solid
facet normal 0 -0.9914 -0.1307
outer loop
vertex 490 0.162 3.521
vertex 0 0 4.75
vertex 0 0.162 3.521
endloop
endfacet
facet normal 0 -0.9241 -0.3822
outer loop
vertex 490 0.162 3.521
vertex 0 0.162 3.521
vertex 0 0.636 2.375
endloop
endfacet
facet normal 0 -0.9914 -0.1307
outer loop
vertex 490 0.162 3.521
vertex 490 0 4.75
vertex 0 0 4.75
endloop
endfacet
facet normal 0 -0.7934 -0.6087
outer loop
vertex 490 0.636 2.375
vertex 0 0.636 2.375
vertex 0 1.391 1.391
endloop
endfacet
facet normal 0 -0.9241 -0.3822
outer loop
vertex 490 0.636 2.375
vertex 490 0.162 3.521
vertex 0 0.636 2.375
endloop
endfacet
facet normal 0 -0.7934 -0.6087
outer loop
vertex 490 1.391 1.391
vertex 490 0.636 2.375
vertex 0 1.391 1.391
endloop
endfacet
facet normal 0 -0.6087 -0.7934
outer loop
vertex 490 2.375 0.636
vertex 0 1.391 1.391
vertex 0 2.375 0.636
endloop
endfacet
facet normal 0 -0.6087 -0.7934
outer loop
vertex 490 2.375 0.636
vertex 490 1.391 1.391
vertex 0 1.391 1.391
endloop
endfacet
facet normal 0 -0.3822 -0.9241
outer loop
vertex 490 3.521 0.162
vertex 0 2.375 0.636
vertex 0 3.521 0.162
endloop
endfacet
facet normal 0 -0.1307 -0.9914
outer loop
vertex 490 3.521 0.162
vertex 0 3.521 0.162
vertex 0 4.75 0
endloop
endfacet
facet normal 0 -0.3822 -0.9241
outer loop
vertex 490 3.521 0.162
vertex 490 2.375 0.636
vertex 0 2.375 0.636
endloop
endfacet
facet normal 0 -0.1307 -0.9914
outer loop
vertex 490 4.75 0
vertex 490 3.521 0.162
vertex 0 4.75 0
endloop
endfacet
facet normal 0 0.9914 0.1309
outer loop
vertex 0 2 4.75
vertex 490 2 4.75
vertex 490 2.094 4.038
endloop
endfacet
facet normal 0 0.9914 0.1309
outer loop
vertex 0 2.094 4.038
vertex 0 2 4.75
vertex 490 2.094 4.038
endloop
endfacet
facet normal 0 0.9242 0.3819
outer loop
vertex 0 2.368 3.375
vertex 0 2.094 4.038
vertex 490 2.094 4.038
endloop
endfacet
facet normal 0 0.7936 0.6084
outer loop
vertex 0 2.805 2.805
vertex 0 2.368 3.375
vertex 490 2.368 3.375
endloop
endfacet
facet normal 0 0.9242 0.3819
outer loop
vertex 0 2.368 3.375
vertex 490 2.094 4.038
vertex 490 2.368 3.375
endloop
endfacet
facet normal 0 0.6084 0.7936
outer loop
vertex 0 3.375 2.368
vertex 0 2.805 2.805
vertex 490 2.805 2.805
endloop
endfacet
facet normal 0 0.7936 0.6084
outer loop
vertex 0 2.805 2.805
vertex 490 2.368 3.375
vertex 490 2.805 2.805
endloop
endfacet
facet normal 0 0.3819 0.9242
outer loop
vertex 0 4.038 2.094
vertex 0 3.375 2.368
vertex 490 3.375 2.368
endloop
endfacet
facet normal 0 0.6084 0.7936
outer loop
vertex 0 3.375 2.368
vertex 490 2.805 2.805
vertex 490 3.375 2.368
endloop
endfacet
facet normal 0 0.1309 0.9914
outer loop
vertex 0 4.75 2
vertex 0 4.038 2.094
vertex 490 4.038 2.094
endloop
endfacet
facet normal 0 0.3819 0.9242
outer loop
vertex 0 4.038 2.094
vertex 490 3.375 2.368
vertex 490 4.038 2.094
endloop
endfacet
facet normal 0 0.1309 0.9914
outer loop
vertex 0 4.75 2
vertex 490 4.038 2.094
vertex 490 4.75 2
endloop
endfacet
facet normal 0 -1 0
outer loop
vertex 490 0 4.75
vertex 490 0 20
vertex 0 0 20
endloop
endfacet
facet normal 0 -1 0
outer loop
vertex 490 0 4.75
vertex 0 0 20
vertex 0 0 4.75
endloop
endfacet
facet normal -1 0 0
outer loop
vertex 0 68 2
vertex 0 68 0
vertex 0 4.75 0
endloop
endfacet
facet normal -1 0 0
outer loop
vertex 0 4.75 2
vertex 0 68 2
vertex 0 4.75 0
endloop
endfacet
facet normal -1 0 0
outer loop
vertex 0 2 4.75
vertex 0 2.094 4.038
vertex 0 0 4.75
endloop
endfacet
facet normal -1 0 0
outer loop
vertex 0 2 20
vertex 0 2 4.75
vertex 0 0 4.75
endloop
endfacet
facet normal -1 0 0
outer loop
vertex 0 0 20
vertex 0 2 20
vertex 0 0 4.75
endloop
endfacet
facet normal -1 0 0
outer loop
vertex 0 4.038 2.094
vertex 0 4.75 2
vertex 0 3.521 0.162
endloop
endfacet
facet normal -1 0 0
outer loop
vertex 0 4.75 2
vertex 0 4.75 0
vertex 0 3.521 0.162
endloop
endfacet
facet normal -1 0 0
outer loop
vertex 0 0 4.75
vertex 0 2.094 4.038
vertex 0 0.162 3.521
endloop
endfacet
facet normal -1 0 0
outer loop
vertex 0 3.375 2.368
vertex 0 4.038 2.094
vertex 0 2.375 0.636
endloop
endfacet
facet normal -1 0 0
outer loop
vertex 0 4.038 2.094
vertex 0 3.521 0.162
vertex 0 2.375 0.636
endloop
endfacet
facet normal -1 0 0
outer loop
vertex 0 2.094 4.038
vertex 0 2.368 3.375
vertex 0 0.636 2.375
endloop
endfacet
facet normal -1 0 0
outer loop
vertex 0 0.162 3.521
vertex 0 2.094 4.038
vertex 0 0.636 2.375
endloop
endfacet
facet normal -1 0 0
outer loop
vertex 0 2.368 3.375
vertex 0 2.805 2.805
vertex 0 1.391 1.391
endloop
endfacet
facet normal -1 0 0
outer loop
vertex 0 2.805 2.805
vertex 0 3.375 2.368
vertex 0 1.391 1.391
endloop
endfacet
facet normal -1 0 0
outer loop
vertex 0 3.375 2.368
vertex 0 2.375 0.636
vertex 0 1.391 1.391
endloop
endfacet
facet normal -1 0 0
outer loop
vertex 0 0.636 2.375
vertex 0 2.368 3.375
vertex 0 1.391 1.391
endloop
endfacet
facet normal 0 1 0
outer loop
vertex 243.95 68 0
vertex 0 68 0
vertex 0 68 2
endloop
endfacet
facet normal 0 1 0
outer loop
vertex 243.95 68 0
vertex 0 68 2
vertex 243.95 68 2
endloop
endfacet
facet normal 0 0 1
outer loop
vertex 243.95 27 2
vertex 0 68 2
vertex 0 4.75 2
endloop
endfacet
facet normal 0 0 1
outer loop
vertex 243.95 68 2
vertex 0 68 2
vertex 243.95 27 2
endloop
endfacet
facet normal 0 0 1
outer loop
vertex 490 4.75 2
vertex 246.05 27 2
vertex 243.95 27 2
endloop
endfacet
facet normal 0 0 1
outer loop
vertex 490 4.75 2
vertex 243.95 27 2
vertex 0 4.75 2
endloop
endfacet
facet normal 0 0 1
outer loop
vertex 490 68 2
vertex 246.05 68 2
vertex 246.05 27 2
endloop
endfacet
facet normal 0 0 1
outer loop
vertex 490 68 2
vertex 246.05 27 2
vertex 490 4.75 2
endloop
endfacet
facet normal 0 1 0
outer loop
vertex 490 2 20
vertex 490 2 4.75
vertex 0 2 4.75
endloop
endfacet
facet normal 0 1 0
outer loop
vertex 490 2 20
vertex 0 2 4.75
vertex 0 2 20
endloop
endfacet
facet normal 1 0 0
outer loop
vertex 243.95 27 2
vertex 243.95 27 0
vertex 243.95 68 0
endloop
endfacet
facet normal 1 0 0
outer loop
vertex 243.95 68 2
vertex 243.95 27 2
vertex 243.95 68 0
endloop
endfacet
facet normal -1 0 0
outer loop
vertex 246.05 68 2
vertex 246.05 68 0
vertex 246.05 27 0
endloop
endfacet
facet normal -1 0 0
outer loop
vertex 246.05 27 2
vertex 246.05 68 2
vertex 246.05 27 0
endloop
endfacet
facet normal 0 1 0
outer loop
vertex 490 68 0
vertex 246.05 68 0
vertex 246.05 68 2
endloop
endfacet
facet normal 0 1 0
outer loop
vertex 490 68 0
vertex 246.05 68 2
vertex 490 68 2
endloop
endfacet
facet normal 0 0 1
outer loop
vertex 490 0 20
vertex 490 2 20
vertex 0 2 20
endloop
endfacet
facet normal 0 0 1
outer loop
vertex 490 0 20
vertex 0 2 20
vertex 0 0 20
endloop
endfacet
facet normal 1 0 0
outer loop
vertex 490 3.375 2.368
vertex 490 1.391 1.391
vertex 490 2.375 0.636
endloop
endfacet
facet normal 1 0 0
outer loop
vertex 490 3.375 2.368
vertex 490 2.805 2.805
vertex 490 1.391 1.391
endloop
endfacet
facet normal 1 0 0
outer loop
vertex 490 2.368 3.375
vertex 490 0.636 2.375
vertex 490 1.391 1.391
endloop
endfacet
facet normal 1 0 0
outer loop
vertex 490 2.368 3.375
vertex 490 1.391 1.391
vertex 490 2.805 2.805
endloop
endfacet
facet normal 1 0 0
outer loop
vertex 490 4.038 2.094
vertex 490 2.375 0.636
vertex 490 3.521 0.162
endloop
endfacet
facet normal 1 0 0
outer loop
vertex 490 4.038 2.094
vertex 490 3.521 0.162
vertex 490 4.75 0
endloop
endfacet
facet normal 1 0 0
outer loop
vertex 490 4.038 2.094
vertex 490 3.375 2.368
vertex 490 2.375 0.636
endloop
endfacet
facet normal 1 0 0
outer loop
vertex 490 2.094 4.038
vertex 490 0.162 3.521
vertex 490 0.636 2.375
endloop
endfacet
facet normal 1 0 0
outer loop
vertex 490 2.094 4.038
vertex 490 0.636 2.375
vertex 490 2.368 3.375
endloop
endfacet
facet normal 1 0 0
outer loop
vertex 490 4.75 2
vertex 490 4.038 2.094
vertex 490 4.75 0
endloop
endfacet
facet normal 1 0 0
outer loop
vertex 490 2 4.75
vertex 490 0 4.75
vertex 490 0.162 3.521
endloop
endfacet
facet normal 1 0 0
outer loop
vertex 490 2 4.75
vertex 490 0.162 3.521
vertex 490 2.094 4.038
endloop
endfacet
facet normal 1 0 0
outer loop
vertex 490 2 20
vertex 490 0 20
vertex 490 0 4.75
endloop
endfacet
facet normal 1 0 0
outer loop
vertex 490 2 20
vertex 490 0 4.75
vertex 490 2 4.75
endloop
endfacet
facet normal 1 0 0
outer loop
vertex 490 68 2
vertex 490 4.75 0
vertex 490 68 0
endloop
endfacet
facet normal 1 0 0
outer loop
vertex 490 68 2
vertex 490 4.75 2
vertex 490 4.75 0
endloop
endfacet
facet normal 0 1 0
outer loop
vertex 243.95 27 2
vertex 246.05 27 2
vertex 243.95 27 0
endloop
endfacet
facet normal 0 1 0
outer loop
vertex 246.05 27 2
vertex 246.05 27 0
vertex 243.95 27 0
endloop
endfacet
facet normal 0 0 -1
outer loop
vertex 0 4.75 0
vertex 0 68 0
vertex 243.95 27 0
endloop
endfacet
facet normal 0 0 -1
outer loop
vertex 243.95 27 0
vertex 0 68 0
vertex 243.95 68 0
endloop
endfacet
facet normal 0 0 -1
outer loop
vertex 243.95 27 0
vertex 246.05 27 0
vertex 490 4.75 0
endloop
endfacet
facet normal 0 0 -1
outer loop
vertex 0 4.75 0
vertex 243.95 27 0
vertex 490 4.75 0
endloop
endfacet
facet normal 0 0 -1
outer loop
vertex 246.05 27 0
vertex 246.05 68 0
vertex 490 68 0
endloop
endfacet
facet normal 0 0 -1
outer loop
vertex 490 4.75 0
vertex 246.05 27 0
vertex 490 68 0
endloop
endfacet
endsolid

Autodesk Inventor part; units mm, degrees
ref_plane "YZ Plane" through (0, 0, 0) normal (1, 0, 0) x (0, 1, 0)
ref_plane "XZ Plane" through (0, 0, 0) normal (0, 1, 0) x (-1, 0, 0)
ref_plane "XY Plane" through (0, 0, 0) normal (0, 0, 1) x (1, 0, 0)
sketch "Sketch1" plane through (0, 0, 0) normal (0, 0, 1) x (1, 0, 0)
  line L0 (-490, 68) -> (490, 68)
  line L1 (490, 68) -> (490, 0)
  line L2 (490, 0) -> (-490, 0)
  line L3 (-490, 0) -> (-490, 68)
  point P0 (0, 0)
  point P1 (0, 0)
  dimension "d0" = 980
  dimension "d1" = 68
extrude "Plate1" add sketch "Sketch1" along normal blind 2
sketch "Sketch2" plane through (490, 2, 0) normal (0, -1, 0) x (1, 0, 0)
  line L0 (-980, 0) -> (0, 0)
  line L1 (0, 0) -> (0, 20)
  line L2 (0, 20) -> (-980, 20)
  line L3 (-980, 20) -> (-980, 0)
edge flange "Flange1" height 20 angle 90 thickness 2 bend radius 2.75 thickness toward (0, -1, 0) relief round relief width 2 relief depth 1 edges at (0, 0, 2) wall of the first edge with corners at (-490, 2, 0) (490, 2, 0) (490, 2, 20) (-490, 2, 20)
bend "Bend1"
corner "Corner1"
sketch "Sketch5" plane through (0, 0, 0) normal (0, 0, -1) x (-1, 0, 0)
  line L0 (490, 68) -> (-490, 68) projected
  line L1 (490, 0) -> (-490, 0) projected
  circle A0 centre (0, 68) radius 35
  line L2 (243.95, 68) -> (246.05, 68)
  line L3 (246.05, 68) -> (246.05, 27)
  line L4 (246.05, 27) -> (243.95, 27)
  line L5 (243.95, 27) -> (243.95, 68)
  line L6 (-243.95, 68) -> (-246.05, 68)
  line L7 (-246.05, 68) -> (-246.05, 27)
  line L8 (-246.05, 27) -> (-243.95, 27)
  line L9 (-243.95, 27) -> (-243.95, 68)
  line L10 (0, 68) -> (0, 0) construction
  line L11 (0, 68) -> (0, 0)
  line L12 (490, 68) -> (490, 4.75) projected
  line L13 (490, 0) -> (490, 4.75) projected
  line L14 (-490, 4.75) -> (-490, 68) projected
  line L15 (-490, 4.75) -> (-490, 0) projected
  point P0 (0, 0)
  point P1 (245, 27)
  point P2 (-245, 27)
  point P3 (-35, 68)
  point P4 (35, 68)
  dimension "d45" = 70
  dimension "d48" = 2.1
  dimension "d49" = 490
  dimension "d51" = 27
  dimension "d52" = 41
extrude "Extrusion1" cut sketch "Sketch5" against normal through all contours L12 L13 L1 L11 A0 L0 L5 L4 L3 | L3 L4 L5 L0 | A0 L11 L0 | L9 L8 L7 L0 picked at (23.0408, 65.4039)
sketch "Sketch9" plane through (0, 0, 2) normal (0, 0, 1) x (1, 0, 0)
  line L0 (485.6141, 29.596) -> (485.6141, 17.596) construction
  line L1 (485.6141, 17.596) -> (285.6141, 17.596) construction
  line L2 (285.6141, 17.596) -> (285.6141, 29.596) construction
  line L3 (285.6141, 29.596) -> (485.6141, 29.596) construction
  line L4 (-490, 68) -> (490, 68) projected
  point P0 (0, 0)
  point P1 (1.05, 68)
  dimension "d40" = 200
  dimension "d41" = 12
mark "Mark2"
equation "\"d1\" = СПИНА_Стрингер_2_высота"
equation "\"d2\" = Thickness"
equation "\"d3\" = BendReliefWidth"
equation "\"d4\" = BendReliefDepth"
equation "\"d5\" = MinimumRemnant"
equation "\"d6\" = TransitionRadius"
equation "\"d9\" = BendRadius"
equation "\"d10\" = CornerReliefSize"
equation "\"d11\" = GapSize"
equation "\"d12\" = JacobiRadiusSize"
equation "\"BendReliefWidth\" = Thickness"
equation "\"BendReliefDepth\" = 0.5 * Thickness"
equation "\"CornerReliefSize\" = 4 * Thickness"
equation "\"MinimumRemnant\" = 2 * Thickness"
equation "\"TransitionRadius\" = BendRadius"
equation "\"JacobiRadiusSize\" = BendRadius"
equation "\"GapSize\" = Thickness"
equation "\"СПИНА_Стрингер_2_высота\" = 68"
equation "\"Thickness\" = 2"
equation "\"BendRadius\" = 2.75"
properties part number "MSC 207 STRINGER BACK ^^" material "Stainless Steel"
